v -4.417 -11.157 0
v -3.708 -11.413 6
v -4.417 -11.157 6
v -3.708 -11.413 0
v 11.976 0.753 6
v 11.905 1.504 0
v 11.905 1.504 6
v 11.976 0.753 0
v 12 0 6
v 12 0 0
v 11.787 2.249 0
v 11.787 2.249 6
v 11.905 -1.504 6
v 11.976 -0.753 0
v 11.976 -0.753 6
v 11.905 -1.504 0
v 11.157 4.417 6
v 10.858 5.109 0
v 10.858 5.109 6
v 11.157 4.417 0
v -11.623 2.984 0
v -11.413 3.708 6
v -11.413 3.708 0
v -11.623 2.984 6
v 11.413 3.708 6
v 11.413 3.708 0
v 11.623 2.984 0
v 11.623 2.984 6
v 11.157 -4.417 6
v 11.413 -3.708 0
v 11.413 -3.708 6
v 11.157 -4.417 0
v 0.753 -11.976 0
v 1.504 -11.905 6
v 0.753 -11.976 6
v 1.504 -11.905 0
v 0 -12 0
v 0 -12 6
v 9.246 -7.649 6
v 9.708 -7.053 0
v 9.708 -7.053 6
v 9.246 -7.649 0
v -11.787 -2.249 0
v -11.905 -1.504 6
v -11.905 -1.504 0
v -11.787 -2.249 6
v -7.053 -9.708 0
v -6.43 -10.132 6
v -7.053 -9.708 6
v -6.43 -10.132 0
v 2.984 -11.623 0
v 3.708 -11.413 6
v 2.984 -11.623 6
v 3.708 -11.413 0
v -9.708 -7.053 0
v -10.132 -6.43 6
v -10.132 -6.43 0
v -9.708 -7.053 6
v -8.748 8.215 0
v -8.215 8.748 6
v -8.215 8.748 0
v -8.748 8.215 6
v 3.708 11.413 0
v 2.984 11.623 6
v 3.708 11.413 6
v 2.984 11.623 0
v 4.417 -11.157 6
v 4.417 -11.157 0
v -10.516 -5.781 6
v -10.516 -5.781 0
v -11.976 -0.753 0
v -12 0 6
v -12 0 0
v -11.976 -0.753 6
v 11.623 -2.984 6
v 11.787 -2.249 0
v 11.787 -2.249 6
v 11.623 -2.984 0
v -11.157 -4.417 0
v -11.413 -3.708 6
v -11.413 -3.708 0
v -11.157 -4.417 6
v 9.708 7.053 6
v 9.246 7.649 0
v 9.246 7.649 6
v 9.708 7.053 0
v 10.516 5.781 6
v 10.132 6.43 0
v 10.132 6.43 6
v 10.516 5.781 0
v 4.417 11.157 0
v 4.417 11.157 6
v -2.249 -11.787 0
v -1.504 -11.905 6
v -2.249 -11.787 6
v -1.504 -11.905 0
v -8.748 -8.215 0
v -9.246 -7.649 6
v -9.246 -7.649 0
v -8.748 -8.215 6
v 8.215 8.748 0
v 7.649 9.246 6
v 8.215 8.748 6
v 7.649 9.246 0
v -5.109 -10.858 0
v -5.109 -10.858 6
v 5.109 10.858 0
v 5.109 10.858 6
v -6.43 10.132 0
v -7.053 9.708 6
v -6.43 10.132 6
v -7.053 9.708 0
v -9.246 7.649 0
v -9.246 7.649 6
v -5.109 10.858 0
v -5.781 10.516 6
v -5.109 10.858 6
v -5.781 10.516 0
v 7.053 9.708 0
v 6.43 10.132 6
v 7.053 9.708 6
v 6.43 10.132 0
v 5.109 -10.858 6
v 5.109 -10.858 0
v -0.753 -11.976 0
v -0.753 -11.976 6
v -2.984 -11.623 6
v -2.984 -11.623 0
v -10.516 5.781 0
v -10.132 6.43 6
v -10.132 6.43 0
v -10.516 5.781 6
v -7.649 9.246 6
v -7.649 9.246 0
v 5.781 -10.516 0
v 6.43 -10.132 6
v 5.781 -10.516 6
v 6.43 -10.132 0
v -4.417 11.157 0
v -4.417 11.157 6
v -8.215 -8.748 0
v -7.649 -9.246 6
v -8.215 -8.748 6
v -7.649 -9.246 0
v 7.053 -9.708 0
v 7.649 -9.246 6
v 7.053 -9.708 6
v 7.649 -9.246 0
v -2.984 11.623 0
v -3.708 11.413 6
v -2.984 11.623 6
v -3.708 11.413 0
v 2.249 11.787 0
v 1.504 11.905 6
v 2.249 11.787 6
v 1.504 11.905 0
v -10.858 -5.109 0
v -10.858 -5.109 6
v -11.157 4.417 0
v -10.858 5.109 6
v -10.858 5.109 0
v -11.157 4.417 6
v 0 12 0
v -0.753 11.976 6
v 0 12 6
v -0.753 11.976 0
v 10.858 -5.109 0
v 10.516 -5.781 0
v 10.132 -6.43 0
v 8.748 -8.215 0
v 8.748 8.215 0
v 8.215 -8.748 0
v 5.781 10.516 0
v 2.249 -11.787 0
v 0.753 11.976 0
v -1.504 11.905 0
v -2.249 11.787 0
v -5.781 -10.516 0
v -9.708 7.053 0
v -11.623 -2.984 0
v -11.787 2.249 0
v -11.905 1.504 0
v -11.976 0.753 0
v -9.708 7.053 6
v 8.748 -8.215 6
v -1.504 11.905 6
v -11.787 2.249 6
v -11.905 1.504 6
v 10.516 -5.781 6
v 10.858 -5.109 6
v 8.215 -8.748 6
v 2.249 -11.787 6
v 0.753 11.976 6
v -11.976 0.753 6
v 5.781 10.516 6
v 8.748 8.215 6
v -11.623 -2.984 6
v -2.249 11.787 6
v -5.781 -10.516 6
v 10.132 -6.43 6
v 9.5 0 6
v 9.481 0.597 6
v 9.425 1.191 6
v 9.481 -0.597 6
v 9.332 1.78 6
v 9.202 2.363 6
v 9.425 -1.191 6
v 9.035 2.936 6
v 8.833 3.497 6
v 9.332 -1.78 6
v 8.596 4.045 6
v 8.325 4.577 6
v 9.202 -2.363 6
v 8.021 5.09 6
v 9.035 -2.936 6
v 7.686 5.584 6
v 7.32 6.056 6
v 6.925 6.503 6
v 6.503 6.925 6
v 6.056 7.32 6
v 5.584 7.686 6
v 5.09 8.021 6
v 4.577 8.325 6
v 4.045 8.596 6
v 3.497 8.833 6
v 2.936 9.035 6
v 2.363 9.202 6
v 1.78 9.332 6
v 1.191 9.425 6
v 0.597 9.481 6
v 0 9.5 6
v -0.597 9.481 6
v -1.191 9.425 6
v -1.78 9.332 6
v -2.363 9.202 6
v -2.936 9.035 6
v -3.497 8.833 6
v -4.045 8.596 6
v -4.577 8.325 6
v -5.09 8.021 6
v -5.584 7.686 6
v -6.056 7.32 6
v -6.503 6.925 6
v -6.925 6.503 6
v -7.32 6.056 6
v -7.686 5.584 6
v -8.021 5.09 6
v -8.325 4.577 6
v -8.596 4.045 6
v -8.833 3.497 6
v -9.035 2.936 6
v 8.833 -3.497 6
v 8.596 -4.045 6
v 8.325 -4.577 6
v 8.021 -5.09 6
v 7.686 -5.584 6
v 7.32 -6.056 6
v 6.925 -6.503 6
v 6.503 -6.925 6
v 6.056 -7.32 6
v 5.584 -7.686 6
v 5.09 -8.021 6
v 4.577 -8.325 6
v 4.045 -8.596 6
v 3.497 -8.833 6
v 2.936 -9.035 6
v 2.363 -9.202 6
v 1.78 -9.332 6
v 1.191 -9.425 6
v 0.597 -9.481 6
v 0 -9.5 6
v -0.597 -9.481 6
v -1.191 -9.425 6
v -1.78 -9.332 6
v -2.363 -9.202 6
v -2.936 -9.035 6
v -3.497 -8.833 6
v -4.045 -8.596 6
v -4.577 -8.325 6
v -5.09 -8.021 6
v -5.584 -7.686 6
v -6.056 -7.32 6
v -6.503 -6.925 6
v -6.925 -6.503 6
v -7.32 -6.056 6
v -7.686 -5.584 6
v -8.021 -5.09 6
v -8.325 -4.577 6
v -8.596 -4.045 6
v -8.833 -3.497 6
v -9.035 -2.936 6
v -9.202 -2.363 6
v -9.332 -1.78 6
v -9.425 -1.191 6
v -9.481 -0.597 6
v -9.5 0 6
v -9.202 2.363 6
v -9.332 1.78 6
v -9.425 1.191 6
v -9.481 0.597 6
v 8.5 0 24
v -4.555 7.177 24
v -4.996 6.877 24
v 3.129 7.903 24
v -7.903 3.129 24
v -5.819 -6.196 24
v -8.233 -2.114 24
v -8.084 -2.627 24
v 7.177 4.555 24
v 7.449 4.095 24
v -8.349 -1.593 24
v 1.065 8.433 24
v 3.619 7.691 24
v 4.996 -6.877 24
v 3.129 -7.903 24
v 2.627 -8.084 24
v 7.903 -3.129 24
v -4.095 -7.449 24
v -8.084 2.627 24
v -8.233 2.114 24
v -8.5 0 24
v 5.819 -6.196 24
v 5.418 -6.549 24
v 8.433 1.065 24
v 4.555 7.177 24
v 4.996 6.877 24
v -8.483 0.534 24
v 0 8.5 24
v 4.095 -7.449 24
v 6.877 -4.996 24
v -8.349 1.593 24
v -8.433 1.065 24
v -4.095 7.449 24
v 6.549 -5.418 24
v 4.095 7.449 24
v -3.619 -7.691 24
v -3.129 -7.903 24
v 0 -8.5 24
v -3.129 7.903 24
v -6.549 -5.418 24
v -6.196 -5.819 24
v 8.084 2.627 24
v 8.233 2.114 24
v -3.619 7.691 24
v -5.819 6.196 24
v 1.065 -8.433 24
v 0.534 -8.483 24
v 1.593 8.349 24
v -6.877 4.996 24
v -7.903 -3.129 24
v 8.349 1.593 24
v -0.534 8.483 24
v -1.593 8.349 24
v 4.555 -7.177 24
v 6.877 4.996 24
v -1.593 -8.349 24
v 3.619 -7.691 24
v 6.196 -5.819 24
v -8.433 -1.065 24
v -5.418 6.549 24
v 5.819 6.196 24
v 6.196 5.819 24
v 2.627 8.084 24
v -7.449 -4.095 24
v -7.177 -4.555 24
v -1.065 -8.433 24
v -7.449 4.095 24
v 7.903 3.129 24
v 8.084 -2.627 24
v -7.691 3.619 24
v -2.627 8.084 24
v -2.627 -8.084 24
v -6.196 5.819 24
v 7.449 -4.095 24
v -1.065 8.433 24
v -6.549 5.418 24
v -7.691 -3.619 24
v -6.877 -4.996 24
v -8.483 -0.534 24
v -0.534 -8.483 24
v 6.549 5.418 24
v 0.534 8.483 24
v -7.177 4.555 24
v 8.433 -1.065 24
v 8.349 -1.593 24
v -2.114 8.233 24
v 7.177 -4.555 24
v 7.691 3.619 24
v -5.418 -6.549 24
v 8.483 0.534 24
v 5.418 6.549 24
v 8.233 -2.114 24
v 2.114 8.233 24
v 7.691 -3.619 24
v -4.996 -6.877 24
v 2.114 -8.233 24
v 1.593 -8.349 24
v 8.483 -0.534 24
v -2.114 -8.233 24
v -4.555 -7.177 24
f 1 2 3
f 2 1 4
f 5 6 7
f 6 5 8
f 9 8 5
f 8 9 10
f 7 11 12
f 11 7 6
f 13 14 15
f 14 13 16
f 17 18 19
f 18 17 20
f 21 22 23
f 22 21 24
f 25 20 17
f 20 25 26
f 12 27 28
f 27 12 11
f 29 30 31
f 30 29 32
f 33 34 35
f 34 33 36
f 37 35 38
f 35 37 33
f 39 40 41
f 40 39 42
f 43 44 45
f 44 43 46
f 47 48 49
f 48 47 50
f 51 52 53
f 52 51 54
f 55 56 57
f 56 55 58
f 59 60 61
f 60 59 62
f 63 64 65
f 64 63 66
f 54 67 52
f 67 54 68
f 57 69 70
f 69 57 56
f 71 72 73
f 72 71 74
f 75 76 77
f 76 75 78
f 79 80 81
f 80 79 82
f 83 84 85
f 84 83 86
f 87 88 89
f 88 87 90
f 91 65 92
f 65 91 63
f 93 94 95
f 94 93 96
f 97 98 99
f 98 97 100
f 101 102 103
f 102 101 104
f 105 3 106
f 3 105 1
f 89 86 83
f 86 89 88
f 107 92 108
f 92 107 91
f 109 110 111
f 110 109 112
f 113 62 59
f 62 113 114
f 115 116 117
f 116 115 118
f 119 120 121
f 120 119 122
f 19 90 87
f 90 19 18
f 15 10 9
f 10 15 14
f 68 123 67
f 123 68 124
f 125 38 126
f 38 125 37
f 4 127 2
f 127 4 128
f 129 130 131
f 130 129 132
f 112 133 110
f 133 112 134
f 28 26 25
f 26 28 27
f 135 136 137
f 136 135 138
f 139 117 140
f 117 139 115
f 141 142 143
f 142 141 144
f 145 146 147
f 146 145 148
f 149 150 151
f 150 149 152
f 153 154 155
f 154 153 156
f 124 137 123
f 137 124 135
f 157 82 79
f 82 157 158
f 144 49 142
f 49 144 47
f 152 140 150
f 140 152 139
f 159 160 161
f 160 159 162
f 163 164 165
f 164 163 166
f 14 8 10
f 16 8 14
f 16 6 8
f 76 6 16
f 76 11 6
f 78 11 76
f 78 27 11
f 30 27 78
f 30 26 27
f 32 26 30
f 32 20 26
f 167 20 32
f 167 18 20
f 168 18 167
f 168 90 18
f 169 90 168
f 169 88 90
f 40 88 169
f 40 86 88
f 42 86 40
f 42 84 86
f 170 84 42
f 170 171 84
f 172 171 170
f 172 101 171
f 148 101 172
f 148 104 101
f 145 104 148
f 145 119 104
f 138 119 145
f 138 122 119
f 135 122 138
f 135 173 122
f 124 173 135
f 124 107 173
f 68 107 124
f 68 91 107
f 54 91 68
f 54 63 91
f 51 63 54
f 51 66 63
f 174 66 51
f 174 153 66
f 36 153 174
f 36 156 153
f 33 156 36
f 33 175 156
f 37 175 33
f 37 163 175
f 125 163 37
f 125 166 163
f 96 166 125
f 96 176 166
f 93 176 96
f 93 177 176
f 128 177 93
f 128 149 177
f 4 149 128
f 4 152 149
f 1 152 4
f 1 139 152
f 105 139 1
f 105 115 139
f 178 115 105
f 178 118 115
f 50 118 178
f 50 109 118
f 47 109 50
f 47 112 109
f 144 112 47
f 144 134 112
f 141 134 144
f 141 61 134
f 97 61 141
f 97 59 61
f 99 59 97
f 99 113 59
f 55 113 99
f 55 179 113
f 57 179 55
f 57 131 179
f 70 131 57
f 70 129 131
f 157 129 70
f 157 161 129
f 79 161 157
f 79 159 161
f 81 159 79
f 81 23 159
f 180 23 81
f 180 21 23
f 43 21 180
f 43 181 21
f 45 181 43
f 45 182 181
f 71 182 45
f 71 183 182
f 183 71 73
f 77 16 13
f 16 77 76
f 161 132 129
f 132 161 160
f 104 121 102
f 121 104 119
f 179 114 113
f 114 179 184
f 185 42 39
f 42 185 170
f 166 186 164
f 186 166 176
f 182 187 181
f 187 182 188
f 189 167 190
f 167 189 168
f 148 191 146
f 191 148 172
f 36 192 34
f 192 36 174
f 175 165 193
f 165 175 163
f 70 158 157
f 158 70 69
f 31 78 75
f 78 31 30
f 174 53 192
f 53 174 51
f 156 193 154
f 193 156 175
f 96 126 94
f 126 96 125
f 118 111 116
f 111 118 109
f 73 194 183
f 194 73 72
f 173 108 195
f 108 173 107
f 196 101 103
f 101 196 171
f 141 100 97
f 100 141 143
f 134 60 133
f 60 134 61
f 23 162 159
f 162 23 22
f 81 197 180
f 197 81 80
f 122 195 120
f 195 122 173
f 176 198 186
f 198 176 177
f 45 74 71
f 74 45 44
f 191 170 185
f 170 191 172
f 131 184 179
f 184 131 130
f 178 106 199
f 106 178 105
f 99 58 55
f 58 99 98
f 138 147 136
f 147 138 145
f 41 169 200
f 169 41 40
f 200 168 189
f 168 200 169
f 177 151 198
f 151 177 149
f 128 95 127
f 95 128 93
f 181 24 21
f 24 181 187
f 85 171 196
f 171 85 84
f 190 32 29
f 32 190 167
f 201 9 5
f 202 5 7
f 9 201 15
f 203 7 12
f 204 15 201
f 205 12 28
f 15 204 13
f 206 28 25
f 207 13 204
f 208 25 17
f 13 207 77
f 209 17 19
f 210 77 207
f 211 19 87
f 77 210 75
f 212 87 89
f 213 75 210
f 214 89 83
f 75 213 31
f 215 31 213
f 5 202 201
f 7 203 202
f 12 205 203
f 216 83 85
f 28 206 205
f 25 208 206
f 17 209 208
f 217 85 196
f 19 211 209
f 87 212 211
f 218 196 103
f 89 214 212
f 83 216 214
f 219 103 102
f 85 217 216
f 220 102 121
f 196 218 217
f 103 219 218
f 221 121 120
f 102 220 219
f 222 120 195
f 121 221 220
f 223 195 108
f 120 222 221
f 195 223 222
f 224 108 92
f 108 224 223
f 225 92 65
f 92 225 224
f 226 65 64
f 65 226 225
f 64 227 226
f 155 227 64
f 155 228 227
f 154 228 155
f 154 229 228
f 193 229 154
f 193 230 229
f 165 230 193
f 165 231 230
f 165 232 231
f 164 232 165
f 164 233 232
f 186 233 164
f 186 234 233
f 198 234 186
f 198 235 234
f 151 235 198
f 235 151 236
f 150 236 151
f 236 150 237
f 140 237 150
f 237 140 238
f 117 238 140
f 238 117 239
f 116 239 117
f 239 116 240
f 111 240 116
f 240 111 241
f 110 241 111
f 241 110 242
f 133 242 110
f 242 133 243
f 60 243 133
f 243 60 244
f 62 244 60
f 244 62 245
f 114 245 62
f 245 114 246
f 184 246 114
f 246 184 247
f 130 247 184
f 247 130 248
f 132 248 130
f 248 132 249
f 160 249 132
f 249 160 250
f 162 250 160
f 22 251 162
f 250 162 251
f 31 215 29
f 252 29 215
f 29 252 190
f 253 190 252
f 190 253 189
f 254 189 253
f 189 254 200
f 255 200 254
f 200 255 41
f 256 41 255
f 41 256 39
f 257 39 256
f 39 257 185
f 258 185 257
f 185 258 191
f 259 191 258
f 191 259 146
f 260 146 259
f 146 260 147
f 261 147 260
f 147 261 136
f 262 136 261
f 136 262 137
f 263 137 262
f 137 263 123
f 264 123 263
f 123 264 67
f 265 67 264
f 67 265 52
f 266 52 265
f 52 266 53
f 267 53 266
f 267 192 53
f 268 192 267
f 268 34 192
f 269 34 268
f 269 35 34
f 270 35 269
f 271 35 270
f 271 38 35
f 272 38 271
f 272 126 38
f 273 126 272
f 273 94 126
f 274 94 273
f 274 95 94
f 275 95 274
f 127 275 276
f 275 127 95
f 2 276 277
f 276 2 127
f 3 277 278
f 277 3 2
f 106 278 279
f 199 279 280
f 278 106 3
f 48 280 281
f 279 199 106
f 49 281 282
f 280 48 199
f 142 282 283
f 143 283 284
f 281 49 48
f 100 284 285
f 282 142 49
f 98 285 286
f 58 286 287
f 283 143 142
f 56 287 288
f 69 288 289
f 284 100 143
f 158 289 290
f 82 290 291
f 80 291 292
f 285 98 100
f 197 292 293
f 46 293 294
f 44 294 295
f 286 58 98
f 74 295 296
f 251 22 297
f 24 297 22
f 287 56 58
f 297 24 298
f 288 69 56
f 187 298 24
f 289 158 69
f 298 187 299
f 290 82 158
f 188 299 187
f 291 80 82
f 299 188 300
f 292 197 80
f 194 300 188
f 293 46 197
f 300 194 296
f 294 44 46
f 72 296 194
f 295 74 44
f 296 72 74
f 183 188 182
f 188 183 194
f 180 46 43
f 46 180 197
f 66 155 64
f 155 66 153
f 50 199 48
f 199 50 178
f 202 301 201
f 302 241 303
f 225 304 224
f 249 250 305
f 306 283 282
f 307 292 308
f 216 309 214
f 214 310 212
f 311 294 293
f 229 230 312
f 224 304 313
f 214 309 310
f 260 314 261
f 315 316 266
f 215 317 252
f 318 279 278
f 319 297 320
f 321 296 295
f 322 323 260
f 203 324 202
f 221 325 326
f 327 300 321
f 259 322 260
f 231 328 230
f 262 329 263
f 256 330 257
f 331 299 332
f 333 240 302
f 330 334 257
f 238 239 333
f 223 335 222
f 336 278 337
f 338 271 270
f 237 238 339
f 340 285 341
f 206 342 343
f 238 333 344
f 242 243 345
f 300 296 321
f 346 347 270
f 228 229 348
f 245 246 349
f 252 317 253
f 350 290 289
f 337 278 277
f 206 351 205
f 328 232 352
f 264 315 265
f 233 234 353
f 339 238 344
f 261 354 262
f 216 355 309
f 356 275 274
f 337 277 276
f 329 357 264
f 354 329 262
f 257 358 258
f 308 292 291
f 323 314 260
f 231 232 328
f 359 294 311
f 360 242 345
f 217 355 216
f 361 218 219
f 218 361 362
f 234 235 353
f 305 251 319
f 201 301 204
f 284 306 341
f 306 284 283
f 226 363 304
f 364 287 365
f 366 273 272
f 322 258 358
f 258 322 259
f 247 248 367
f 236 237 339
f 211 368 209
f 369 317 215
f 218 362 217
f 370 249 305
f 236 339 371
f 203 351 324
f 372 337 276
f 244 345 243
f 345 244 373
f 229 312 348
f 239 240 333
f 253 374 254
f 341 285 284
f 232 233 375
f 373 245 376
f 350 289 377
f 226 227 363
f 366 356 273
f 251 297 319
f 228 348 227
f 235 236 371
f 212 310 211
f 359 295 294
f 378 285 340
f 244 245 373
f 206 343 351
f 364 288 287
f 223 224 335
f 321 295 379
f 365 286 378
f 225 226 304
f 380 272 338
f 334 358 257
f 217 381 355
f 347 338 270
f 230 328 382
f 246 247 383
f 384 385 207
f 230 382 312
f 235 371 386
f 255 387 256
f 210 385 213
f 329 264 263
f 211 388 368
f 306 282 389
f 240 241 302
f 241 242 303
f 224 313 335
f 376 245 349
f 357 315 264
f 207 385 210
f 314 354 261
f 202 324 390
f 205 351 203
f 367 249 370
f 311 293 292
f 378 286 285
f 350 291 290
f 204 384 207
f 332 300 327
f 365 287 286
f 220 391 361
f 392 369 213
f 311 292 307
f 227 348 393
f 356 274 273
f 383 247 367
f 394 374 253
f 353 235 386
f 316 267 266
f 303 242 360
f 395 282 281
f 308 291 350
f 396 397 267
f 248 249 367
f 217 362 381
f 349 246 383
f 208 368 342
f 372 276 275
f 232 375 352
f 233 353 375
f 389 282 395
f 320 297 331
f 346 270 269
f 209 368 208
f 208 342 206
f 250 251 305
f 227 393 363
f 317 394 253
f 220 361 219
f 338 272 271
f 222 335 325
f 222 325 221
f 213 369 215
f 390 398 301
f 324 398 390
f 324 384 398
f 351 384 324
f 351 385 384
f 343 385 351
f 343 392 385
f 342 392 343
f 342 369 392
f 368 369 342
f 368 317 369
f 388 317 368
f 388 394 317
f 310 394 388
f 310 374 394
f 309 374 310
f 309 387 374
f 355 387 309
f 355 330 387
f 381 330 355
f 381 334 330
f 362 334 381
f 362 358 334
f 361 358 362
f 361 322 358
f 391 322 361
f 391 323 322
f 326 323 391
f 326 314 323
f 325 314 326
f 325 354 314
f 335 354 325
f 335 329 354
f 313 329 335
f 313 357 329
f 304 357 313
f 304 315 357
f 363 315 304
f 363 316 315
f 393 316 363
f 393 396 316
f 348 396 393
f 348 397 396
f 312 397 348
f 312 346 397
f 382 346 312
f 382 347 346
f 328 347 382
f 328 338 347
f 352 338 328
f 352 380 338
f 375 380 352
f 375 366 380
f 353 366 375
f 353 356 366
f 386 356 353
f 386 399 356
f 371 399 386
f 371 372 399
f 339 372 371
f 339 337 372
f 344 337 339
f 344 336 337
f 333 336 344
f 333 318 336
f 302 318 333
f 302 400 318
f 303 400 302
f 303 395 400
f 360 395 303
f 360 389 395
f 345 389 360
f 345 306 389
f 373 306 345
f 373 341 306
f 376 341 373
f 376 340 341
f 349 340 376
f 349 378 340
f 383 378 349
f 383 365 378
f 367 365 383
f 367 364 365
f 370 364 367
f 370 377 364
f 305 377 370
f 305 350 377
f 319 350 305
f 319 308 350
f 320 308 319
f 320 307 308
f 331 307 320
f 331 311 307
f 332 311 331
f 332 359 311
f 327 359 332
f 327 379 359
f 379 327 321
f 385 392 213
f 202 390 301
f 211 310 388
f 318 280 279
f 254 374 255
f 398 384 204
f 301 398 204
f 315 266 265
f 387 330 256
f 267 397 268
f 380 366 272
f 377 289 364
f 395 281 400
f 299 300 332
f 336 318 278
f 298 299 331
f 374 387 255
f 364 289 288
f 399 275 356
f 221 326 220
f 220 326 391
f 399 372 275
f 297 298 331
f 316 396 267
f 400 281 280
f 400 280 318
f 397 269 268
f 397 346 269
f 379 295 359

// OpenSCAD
 
 $fn=100;
 //TAPA
 union(){
cylinder(r=12,h=6);
  translate([0,0,6]) 
cylinder(r1=9.5, r2=8.5, h=18);
    
}

//BASE
//difference(){
 //   rotate([0,0,0])
 //      translate([30,0,0]) 
//cylinder(r=10.8, h=60);
 //      translate([30,0,2]) 
//cylinder(r=8.8, h=60);
//}
